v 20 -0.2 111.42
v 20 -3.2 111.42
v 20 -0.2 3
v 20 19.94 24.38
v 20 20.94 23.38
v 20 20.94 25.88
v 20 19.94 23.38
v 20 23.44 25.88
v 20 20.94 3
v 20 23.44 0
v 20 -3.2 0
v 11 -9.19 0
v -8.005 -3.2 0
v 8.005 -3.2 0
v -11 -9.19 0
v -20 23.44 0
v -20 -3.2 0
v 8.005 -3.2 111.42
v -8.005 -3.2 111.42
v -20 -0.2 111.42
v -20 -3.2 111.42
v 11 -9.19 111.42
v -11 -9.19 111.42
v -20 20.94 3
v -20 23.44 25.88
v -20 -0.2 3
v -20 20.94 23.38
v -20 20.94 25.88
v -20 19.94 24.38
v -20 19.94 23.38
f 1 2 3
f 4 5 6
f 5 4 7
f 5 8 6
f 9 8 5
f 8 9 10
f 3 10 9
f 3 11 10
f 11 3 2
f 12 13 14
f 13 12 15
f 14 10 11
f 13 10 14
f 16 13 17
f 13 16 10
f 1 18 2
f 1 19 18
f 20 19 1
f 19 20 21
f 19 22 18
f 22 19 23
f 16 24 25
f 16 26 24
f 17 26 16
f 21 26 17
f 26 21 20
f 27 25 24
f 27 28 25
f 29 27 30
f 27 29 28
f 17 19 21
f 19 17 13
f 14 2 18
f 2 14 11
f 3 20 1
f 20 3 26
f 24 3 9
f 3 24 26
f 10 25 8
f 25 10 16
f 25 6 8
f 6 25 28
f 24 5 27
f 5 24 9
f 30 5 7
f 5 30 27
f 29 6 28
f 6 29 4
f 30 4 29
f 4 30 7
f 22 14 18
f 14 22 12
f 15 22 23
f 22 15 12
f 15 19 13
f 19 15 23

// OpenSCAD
// file: rail-clip.scad
// Bunk rail system, shared library.
//
// A rail clip hooks over a bed's top guardrail rail. Its plate carries a
// vertical dovetail tail; every accessory (cup, tissue box, cubby, and
// later a wardrobe rod or hooks) has a matching socket on its back and
// slides down onto the tail from above until the tail's bottom end sits
// on the socket floor. Wide accessories take two or more clips.
//
// Defaults are the owner's caliper readings (2026-11-08) of a Bellemave
// twin low loft (FST00301-TB-AH): top rail 20.74 front-to-back x 20.38
// tall, lower rails about 15.5 tall x 20.18, 80.54 from the top rail's
// bottom to the next rail's top. The owner reports the rails are 80 apart
// all the way down.
//
// Clip axes: X runs along the rail, Y points away from the rail toward
// the accessory, Z is up. The top rail's bottom face is z = 0 and its
// accessory-side face is y = 0. Inside or outside the bed is the same
// part turned the other way round.
//
// Accessory axes: X along the rail, Y away from the clip, Z up. The
// accessory's back face is y = 0 and the socket floor (where the tail's
// foot rests) is z = 0. Everything below z = 0 is the socket floor.

// ---- dovetail interface (keep these fixed so all parts interchange) ----
function dt_base() = 16;    // tail width at the plate
function dt_tip() = 22;     // tail width at its face
function dt_depth() = 6;    // how far the tail stands off the plate
function dt_wall() = 3;     // accessory material around the socket
function dt_floor() = 2.4;  // socket floor under the tail's foot
function dt_block_w(c) = dt_tip() + 2 * c + 2 * dt_wall();
function dt_block_d(c) = dt_depth() + c + dt_wall();

module dt_profile() {
  polygon([[-dt_base() / 2, 0], [dt_base() / 2, 0],
           [dt_tip() / 2, dt_depth()], [-dt_tip() / 2, dt_depth()]]);
}

// male tail on the clip, standing on y = 0, from z0 to z1
module dt_tail(z0, z1) {
  translate([0, 0, z0]) linear_extrude(z1 - z0) dt_profile();
}

// socket cut, clearance c on every mating face, open through y < 0
module dt_socket(z0, z1, c) {
  translate([0, 0, z0]) linear_extrude(z1 - z0) union() {
    offset(delta = c) dt_profile();
    translate([-dt_base() / 2 - c - 1, -1]) square([dt_base() + 2 * c + 2, 1 + c]);
  }
}

// Give an accessory its mount block(s) and socket(s). Children are the
// accessory body, starting at y = dt_block_d(c). h is the block height
// above the socket floor; xs are the socket centers along X (a clip each).
module with_mounts(h, c = 0.25, xs = [0]) {
  bw = dt_block_w(c);
  bd = dt_block_d(c);
  difference() {
    union() {
      children();
      for (x = xs) translate([x - bw / 2, 0, -dt_floor()]) cube([bw, bd + 0.01, h + dt_floor()]);
    }
    for (x = xs) translate([x, 0, 0]) dt_socket(0, h + 1, c);
    // lead-in chamfer at each socket mouth
    for (x = xs) translate([x, 0, h - 1.5])
      linear_extrude(1.51, scale = 1.25) offset(delta = 0.25) dt_profile();
  }
}

// ---- clip ----
function clip_top(rail_h = 20.38, wall = 3) = rail_h + wall;
function clip_foot(rail_gap = 80.54, brace = 7.5) = -(rail_gap + brace);
function clip_mount_y(clear = 0.4, wall = 3) = clear / 2 + wall;

module rail_clip(rail_d = 20.74, rail_h = 20.38, rail_gap = 80.54,
                 hook_w = 40, wall = 3, leg_t = 2.5, lip = 1.0, lip_h = 2.5,
                 brace = 7.5, clear = 0.4, eps = 0.01) {
  top_z = clip_top(rail_h, wall);
  foot_z = clip_foot(rail_gap, brace);
  near_y = clear / 2;
  far_y = -(rail_d + clear / 2);
  // plate down the near face, resting on the next rail's face
  translate([-hook_w / 2, near_y, foot_z]) cube([hook_w, wall, top_z - foot_z]);
  // saddle across the rail top
  translate([-hook_w / 2, far_y - leg_t, rail_h])
    cube([hook_w, rail_d + clear + leg_t + wall, wall]);
  // far leg down the rail's far face
  translate([-hook_w / 2, far_y - leg_t, -lip_h]) cube([hook_w, leg_t, rail_h + lip_h + eps]);
  // snap lip under the rail's far edge, lead-in chamfer on its lower face
  translate([hook_w / 2, far_y, -lip_h]) rotate([0, -90, 0]) linear_extrude(hook_w)
    polygon([[0, 0], [lip_h, 0], [lip_h, lip], [lip_h - lip, lip]]);
  // dovetail tail on the plate's outer face, full plate height
  translate([0, clip_mount_y(clear, wall) - eps, 0]) dt_tail(foot_z, top_z);
}

// place an accessory (in accessory axes) on a default clip at x
module on_clip(x = 0, clear = 0.4, wall = 3, rail_gap = 80.54, brace = 7.5) {
  translate([x, clip_mount_y(clear, wall), clip_foot(rail_gap, brace)])
    children();
}

// the bed's rails, for renders only (accessory side is +Y)
module rail_ghost(rail_d = 20.74, rail_h = 20.38, rail_gap = 80.54, low_d = 20.18, low_h = 15.5) {
  color("pink", 0.5) {
    translate([-200, -rail_d, 0]) cube([400, rail_d, rail_h]);
    translate([-200, -rail_d / 2 - low_d / 2, -rail_gap - low_h]) cube([400, low_d, low_h]);
  }
}

// assembly preview: rails, clips at xs, accessory. The clip is the same
// part inside or outside the bed; it just goes on the other way round.
module bunk_assembly(xs = [0]) {
  rail_ghost();
  for (x = xs) color("orchid") translate([x, 0, 0]) rail_clip();
  color("plum") on_clip() children();
}
// main file
// Bunk rail clip: hooks over the bed's top guardrail rail and carries the
// dovetail tail every accessory slides onto. The same clip works on the
// inside or the outside of the bed; turn it round. Print one per socket.
//
// The exported clip is flipped for printing: saddle flat on the bed,
// plate, far leg and tail standing up from it, no supports. (Printed the
// other way up, the far leg would start in mid-air.)

use <rail-clip.scad>

/* [Rail, measure yours] */
rail_d = 20.74;   // top rail, front to back
rail_h = 20.38;   // top rail height
rail_gap = 80.54; // top rail bottom to next rail top
clear = 0.4;      // added to the rail's depth for the saddle

/* [Clip] */
hook_w = 40;      // along the rail
wall = 3;         // saddle and plate thickness
leg_t = 2.5;      // far leg thickness (this is the part that flexes)
lip = 1.0;        // how far the snap lip reaches under the rail
lip_h = 2.5;
brace = 7.5;      // how far the plate laps over the next rail's face

part = "clip"; // [clip, assembly]

if (part == "assembly") { rail_ghost(rail_d, rail_h, rail_gap); color("orchid")
  rail_clip(rail_d, rail_h, rail_gap, hook_w, wall, leg_t, lip, lip_h, brace, clear); }
else translate([0, 0, rail_h + wall]) rotate([180, 0, 0])
  rail_clip(rail_d, rail_h, rail_gap, hook_w, wall, leg_t, lip, lip_h, brace, clear);
